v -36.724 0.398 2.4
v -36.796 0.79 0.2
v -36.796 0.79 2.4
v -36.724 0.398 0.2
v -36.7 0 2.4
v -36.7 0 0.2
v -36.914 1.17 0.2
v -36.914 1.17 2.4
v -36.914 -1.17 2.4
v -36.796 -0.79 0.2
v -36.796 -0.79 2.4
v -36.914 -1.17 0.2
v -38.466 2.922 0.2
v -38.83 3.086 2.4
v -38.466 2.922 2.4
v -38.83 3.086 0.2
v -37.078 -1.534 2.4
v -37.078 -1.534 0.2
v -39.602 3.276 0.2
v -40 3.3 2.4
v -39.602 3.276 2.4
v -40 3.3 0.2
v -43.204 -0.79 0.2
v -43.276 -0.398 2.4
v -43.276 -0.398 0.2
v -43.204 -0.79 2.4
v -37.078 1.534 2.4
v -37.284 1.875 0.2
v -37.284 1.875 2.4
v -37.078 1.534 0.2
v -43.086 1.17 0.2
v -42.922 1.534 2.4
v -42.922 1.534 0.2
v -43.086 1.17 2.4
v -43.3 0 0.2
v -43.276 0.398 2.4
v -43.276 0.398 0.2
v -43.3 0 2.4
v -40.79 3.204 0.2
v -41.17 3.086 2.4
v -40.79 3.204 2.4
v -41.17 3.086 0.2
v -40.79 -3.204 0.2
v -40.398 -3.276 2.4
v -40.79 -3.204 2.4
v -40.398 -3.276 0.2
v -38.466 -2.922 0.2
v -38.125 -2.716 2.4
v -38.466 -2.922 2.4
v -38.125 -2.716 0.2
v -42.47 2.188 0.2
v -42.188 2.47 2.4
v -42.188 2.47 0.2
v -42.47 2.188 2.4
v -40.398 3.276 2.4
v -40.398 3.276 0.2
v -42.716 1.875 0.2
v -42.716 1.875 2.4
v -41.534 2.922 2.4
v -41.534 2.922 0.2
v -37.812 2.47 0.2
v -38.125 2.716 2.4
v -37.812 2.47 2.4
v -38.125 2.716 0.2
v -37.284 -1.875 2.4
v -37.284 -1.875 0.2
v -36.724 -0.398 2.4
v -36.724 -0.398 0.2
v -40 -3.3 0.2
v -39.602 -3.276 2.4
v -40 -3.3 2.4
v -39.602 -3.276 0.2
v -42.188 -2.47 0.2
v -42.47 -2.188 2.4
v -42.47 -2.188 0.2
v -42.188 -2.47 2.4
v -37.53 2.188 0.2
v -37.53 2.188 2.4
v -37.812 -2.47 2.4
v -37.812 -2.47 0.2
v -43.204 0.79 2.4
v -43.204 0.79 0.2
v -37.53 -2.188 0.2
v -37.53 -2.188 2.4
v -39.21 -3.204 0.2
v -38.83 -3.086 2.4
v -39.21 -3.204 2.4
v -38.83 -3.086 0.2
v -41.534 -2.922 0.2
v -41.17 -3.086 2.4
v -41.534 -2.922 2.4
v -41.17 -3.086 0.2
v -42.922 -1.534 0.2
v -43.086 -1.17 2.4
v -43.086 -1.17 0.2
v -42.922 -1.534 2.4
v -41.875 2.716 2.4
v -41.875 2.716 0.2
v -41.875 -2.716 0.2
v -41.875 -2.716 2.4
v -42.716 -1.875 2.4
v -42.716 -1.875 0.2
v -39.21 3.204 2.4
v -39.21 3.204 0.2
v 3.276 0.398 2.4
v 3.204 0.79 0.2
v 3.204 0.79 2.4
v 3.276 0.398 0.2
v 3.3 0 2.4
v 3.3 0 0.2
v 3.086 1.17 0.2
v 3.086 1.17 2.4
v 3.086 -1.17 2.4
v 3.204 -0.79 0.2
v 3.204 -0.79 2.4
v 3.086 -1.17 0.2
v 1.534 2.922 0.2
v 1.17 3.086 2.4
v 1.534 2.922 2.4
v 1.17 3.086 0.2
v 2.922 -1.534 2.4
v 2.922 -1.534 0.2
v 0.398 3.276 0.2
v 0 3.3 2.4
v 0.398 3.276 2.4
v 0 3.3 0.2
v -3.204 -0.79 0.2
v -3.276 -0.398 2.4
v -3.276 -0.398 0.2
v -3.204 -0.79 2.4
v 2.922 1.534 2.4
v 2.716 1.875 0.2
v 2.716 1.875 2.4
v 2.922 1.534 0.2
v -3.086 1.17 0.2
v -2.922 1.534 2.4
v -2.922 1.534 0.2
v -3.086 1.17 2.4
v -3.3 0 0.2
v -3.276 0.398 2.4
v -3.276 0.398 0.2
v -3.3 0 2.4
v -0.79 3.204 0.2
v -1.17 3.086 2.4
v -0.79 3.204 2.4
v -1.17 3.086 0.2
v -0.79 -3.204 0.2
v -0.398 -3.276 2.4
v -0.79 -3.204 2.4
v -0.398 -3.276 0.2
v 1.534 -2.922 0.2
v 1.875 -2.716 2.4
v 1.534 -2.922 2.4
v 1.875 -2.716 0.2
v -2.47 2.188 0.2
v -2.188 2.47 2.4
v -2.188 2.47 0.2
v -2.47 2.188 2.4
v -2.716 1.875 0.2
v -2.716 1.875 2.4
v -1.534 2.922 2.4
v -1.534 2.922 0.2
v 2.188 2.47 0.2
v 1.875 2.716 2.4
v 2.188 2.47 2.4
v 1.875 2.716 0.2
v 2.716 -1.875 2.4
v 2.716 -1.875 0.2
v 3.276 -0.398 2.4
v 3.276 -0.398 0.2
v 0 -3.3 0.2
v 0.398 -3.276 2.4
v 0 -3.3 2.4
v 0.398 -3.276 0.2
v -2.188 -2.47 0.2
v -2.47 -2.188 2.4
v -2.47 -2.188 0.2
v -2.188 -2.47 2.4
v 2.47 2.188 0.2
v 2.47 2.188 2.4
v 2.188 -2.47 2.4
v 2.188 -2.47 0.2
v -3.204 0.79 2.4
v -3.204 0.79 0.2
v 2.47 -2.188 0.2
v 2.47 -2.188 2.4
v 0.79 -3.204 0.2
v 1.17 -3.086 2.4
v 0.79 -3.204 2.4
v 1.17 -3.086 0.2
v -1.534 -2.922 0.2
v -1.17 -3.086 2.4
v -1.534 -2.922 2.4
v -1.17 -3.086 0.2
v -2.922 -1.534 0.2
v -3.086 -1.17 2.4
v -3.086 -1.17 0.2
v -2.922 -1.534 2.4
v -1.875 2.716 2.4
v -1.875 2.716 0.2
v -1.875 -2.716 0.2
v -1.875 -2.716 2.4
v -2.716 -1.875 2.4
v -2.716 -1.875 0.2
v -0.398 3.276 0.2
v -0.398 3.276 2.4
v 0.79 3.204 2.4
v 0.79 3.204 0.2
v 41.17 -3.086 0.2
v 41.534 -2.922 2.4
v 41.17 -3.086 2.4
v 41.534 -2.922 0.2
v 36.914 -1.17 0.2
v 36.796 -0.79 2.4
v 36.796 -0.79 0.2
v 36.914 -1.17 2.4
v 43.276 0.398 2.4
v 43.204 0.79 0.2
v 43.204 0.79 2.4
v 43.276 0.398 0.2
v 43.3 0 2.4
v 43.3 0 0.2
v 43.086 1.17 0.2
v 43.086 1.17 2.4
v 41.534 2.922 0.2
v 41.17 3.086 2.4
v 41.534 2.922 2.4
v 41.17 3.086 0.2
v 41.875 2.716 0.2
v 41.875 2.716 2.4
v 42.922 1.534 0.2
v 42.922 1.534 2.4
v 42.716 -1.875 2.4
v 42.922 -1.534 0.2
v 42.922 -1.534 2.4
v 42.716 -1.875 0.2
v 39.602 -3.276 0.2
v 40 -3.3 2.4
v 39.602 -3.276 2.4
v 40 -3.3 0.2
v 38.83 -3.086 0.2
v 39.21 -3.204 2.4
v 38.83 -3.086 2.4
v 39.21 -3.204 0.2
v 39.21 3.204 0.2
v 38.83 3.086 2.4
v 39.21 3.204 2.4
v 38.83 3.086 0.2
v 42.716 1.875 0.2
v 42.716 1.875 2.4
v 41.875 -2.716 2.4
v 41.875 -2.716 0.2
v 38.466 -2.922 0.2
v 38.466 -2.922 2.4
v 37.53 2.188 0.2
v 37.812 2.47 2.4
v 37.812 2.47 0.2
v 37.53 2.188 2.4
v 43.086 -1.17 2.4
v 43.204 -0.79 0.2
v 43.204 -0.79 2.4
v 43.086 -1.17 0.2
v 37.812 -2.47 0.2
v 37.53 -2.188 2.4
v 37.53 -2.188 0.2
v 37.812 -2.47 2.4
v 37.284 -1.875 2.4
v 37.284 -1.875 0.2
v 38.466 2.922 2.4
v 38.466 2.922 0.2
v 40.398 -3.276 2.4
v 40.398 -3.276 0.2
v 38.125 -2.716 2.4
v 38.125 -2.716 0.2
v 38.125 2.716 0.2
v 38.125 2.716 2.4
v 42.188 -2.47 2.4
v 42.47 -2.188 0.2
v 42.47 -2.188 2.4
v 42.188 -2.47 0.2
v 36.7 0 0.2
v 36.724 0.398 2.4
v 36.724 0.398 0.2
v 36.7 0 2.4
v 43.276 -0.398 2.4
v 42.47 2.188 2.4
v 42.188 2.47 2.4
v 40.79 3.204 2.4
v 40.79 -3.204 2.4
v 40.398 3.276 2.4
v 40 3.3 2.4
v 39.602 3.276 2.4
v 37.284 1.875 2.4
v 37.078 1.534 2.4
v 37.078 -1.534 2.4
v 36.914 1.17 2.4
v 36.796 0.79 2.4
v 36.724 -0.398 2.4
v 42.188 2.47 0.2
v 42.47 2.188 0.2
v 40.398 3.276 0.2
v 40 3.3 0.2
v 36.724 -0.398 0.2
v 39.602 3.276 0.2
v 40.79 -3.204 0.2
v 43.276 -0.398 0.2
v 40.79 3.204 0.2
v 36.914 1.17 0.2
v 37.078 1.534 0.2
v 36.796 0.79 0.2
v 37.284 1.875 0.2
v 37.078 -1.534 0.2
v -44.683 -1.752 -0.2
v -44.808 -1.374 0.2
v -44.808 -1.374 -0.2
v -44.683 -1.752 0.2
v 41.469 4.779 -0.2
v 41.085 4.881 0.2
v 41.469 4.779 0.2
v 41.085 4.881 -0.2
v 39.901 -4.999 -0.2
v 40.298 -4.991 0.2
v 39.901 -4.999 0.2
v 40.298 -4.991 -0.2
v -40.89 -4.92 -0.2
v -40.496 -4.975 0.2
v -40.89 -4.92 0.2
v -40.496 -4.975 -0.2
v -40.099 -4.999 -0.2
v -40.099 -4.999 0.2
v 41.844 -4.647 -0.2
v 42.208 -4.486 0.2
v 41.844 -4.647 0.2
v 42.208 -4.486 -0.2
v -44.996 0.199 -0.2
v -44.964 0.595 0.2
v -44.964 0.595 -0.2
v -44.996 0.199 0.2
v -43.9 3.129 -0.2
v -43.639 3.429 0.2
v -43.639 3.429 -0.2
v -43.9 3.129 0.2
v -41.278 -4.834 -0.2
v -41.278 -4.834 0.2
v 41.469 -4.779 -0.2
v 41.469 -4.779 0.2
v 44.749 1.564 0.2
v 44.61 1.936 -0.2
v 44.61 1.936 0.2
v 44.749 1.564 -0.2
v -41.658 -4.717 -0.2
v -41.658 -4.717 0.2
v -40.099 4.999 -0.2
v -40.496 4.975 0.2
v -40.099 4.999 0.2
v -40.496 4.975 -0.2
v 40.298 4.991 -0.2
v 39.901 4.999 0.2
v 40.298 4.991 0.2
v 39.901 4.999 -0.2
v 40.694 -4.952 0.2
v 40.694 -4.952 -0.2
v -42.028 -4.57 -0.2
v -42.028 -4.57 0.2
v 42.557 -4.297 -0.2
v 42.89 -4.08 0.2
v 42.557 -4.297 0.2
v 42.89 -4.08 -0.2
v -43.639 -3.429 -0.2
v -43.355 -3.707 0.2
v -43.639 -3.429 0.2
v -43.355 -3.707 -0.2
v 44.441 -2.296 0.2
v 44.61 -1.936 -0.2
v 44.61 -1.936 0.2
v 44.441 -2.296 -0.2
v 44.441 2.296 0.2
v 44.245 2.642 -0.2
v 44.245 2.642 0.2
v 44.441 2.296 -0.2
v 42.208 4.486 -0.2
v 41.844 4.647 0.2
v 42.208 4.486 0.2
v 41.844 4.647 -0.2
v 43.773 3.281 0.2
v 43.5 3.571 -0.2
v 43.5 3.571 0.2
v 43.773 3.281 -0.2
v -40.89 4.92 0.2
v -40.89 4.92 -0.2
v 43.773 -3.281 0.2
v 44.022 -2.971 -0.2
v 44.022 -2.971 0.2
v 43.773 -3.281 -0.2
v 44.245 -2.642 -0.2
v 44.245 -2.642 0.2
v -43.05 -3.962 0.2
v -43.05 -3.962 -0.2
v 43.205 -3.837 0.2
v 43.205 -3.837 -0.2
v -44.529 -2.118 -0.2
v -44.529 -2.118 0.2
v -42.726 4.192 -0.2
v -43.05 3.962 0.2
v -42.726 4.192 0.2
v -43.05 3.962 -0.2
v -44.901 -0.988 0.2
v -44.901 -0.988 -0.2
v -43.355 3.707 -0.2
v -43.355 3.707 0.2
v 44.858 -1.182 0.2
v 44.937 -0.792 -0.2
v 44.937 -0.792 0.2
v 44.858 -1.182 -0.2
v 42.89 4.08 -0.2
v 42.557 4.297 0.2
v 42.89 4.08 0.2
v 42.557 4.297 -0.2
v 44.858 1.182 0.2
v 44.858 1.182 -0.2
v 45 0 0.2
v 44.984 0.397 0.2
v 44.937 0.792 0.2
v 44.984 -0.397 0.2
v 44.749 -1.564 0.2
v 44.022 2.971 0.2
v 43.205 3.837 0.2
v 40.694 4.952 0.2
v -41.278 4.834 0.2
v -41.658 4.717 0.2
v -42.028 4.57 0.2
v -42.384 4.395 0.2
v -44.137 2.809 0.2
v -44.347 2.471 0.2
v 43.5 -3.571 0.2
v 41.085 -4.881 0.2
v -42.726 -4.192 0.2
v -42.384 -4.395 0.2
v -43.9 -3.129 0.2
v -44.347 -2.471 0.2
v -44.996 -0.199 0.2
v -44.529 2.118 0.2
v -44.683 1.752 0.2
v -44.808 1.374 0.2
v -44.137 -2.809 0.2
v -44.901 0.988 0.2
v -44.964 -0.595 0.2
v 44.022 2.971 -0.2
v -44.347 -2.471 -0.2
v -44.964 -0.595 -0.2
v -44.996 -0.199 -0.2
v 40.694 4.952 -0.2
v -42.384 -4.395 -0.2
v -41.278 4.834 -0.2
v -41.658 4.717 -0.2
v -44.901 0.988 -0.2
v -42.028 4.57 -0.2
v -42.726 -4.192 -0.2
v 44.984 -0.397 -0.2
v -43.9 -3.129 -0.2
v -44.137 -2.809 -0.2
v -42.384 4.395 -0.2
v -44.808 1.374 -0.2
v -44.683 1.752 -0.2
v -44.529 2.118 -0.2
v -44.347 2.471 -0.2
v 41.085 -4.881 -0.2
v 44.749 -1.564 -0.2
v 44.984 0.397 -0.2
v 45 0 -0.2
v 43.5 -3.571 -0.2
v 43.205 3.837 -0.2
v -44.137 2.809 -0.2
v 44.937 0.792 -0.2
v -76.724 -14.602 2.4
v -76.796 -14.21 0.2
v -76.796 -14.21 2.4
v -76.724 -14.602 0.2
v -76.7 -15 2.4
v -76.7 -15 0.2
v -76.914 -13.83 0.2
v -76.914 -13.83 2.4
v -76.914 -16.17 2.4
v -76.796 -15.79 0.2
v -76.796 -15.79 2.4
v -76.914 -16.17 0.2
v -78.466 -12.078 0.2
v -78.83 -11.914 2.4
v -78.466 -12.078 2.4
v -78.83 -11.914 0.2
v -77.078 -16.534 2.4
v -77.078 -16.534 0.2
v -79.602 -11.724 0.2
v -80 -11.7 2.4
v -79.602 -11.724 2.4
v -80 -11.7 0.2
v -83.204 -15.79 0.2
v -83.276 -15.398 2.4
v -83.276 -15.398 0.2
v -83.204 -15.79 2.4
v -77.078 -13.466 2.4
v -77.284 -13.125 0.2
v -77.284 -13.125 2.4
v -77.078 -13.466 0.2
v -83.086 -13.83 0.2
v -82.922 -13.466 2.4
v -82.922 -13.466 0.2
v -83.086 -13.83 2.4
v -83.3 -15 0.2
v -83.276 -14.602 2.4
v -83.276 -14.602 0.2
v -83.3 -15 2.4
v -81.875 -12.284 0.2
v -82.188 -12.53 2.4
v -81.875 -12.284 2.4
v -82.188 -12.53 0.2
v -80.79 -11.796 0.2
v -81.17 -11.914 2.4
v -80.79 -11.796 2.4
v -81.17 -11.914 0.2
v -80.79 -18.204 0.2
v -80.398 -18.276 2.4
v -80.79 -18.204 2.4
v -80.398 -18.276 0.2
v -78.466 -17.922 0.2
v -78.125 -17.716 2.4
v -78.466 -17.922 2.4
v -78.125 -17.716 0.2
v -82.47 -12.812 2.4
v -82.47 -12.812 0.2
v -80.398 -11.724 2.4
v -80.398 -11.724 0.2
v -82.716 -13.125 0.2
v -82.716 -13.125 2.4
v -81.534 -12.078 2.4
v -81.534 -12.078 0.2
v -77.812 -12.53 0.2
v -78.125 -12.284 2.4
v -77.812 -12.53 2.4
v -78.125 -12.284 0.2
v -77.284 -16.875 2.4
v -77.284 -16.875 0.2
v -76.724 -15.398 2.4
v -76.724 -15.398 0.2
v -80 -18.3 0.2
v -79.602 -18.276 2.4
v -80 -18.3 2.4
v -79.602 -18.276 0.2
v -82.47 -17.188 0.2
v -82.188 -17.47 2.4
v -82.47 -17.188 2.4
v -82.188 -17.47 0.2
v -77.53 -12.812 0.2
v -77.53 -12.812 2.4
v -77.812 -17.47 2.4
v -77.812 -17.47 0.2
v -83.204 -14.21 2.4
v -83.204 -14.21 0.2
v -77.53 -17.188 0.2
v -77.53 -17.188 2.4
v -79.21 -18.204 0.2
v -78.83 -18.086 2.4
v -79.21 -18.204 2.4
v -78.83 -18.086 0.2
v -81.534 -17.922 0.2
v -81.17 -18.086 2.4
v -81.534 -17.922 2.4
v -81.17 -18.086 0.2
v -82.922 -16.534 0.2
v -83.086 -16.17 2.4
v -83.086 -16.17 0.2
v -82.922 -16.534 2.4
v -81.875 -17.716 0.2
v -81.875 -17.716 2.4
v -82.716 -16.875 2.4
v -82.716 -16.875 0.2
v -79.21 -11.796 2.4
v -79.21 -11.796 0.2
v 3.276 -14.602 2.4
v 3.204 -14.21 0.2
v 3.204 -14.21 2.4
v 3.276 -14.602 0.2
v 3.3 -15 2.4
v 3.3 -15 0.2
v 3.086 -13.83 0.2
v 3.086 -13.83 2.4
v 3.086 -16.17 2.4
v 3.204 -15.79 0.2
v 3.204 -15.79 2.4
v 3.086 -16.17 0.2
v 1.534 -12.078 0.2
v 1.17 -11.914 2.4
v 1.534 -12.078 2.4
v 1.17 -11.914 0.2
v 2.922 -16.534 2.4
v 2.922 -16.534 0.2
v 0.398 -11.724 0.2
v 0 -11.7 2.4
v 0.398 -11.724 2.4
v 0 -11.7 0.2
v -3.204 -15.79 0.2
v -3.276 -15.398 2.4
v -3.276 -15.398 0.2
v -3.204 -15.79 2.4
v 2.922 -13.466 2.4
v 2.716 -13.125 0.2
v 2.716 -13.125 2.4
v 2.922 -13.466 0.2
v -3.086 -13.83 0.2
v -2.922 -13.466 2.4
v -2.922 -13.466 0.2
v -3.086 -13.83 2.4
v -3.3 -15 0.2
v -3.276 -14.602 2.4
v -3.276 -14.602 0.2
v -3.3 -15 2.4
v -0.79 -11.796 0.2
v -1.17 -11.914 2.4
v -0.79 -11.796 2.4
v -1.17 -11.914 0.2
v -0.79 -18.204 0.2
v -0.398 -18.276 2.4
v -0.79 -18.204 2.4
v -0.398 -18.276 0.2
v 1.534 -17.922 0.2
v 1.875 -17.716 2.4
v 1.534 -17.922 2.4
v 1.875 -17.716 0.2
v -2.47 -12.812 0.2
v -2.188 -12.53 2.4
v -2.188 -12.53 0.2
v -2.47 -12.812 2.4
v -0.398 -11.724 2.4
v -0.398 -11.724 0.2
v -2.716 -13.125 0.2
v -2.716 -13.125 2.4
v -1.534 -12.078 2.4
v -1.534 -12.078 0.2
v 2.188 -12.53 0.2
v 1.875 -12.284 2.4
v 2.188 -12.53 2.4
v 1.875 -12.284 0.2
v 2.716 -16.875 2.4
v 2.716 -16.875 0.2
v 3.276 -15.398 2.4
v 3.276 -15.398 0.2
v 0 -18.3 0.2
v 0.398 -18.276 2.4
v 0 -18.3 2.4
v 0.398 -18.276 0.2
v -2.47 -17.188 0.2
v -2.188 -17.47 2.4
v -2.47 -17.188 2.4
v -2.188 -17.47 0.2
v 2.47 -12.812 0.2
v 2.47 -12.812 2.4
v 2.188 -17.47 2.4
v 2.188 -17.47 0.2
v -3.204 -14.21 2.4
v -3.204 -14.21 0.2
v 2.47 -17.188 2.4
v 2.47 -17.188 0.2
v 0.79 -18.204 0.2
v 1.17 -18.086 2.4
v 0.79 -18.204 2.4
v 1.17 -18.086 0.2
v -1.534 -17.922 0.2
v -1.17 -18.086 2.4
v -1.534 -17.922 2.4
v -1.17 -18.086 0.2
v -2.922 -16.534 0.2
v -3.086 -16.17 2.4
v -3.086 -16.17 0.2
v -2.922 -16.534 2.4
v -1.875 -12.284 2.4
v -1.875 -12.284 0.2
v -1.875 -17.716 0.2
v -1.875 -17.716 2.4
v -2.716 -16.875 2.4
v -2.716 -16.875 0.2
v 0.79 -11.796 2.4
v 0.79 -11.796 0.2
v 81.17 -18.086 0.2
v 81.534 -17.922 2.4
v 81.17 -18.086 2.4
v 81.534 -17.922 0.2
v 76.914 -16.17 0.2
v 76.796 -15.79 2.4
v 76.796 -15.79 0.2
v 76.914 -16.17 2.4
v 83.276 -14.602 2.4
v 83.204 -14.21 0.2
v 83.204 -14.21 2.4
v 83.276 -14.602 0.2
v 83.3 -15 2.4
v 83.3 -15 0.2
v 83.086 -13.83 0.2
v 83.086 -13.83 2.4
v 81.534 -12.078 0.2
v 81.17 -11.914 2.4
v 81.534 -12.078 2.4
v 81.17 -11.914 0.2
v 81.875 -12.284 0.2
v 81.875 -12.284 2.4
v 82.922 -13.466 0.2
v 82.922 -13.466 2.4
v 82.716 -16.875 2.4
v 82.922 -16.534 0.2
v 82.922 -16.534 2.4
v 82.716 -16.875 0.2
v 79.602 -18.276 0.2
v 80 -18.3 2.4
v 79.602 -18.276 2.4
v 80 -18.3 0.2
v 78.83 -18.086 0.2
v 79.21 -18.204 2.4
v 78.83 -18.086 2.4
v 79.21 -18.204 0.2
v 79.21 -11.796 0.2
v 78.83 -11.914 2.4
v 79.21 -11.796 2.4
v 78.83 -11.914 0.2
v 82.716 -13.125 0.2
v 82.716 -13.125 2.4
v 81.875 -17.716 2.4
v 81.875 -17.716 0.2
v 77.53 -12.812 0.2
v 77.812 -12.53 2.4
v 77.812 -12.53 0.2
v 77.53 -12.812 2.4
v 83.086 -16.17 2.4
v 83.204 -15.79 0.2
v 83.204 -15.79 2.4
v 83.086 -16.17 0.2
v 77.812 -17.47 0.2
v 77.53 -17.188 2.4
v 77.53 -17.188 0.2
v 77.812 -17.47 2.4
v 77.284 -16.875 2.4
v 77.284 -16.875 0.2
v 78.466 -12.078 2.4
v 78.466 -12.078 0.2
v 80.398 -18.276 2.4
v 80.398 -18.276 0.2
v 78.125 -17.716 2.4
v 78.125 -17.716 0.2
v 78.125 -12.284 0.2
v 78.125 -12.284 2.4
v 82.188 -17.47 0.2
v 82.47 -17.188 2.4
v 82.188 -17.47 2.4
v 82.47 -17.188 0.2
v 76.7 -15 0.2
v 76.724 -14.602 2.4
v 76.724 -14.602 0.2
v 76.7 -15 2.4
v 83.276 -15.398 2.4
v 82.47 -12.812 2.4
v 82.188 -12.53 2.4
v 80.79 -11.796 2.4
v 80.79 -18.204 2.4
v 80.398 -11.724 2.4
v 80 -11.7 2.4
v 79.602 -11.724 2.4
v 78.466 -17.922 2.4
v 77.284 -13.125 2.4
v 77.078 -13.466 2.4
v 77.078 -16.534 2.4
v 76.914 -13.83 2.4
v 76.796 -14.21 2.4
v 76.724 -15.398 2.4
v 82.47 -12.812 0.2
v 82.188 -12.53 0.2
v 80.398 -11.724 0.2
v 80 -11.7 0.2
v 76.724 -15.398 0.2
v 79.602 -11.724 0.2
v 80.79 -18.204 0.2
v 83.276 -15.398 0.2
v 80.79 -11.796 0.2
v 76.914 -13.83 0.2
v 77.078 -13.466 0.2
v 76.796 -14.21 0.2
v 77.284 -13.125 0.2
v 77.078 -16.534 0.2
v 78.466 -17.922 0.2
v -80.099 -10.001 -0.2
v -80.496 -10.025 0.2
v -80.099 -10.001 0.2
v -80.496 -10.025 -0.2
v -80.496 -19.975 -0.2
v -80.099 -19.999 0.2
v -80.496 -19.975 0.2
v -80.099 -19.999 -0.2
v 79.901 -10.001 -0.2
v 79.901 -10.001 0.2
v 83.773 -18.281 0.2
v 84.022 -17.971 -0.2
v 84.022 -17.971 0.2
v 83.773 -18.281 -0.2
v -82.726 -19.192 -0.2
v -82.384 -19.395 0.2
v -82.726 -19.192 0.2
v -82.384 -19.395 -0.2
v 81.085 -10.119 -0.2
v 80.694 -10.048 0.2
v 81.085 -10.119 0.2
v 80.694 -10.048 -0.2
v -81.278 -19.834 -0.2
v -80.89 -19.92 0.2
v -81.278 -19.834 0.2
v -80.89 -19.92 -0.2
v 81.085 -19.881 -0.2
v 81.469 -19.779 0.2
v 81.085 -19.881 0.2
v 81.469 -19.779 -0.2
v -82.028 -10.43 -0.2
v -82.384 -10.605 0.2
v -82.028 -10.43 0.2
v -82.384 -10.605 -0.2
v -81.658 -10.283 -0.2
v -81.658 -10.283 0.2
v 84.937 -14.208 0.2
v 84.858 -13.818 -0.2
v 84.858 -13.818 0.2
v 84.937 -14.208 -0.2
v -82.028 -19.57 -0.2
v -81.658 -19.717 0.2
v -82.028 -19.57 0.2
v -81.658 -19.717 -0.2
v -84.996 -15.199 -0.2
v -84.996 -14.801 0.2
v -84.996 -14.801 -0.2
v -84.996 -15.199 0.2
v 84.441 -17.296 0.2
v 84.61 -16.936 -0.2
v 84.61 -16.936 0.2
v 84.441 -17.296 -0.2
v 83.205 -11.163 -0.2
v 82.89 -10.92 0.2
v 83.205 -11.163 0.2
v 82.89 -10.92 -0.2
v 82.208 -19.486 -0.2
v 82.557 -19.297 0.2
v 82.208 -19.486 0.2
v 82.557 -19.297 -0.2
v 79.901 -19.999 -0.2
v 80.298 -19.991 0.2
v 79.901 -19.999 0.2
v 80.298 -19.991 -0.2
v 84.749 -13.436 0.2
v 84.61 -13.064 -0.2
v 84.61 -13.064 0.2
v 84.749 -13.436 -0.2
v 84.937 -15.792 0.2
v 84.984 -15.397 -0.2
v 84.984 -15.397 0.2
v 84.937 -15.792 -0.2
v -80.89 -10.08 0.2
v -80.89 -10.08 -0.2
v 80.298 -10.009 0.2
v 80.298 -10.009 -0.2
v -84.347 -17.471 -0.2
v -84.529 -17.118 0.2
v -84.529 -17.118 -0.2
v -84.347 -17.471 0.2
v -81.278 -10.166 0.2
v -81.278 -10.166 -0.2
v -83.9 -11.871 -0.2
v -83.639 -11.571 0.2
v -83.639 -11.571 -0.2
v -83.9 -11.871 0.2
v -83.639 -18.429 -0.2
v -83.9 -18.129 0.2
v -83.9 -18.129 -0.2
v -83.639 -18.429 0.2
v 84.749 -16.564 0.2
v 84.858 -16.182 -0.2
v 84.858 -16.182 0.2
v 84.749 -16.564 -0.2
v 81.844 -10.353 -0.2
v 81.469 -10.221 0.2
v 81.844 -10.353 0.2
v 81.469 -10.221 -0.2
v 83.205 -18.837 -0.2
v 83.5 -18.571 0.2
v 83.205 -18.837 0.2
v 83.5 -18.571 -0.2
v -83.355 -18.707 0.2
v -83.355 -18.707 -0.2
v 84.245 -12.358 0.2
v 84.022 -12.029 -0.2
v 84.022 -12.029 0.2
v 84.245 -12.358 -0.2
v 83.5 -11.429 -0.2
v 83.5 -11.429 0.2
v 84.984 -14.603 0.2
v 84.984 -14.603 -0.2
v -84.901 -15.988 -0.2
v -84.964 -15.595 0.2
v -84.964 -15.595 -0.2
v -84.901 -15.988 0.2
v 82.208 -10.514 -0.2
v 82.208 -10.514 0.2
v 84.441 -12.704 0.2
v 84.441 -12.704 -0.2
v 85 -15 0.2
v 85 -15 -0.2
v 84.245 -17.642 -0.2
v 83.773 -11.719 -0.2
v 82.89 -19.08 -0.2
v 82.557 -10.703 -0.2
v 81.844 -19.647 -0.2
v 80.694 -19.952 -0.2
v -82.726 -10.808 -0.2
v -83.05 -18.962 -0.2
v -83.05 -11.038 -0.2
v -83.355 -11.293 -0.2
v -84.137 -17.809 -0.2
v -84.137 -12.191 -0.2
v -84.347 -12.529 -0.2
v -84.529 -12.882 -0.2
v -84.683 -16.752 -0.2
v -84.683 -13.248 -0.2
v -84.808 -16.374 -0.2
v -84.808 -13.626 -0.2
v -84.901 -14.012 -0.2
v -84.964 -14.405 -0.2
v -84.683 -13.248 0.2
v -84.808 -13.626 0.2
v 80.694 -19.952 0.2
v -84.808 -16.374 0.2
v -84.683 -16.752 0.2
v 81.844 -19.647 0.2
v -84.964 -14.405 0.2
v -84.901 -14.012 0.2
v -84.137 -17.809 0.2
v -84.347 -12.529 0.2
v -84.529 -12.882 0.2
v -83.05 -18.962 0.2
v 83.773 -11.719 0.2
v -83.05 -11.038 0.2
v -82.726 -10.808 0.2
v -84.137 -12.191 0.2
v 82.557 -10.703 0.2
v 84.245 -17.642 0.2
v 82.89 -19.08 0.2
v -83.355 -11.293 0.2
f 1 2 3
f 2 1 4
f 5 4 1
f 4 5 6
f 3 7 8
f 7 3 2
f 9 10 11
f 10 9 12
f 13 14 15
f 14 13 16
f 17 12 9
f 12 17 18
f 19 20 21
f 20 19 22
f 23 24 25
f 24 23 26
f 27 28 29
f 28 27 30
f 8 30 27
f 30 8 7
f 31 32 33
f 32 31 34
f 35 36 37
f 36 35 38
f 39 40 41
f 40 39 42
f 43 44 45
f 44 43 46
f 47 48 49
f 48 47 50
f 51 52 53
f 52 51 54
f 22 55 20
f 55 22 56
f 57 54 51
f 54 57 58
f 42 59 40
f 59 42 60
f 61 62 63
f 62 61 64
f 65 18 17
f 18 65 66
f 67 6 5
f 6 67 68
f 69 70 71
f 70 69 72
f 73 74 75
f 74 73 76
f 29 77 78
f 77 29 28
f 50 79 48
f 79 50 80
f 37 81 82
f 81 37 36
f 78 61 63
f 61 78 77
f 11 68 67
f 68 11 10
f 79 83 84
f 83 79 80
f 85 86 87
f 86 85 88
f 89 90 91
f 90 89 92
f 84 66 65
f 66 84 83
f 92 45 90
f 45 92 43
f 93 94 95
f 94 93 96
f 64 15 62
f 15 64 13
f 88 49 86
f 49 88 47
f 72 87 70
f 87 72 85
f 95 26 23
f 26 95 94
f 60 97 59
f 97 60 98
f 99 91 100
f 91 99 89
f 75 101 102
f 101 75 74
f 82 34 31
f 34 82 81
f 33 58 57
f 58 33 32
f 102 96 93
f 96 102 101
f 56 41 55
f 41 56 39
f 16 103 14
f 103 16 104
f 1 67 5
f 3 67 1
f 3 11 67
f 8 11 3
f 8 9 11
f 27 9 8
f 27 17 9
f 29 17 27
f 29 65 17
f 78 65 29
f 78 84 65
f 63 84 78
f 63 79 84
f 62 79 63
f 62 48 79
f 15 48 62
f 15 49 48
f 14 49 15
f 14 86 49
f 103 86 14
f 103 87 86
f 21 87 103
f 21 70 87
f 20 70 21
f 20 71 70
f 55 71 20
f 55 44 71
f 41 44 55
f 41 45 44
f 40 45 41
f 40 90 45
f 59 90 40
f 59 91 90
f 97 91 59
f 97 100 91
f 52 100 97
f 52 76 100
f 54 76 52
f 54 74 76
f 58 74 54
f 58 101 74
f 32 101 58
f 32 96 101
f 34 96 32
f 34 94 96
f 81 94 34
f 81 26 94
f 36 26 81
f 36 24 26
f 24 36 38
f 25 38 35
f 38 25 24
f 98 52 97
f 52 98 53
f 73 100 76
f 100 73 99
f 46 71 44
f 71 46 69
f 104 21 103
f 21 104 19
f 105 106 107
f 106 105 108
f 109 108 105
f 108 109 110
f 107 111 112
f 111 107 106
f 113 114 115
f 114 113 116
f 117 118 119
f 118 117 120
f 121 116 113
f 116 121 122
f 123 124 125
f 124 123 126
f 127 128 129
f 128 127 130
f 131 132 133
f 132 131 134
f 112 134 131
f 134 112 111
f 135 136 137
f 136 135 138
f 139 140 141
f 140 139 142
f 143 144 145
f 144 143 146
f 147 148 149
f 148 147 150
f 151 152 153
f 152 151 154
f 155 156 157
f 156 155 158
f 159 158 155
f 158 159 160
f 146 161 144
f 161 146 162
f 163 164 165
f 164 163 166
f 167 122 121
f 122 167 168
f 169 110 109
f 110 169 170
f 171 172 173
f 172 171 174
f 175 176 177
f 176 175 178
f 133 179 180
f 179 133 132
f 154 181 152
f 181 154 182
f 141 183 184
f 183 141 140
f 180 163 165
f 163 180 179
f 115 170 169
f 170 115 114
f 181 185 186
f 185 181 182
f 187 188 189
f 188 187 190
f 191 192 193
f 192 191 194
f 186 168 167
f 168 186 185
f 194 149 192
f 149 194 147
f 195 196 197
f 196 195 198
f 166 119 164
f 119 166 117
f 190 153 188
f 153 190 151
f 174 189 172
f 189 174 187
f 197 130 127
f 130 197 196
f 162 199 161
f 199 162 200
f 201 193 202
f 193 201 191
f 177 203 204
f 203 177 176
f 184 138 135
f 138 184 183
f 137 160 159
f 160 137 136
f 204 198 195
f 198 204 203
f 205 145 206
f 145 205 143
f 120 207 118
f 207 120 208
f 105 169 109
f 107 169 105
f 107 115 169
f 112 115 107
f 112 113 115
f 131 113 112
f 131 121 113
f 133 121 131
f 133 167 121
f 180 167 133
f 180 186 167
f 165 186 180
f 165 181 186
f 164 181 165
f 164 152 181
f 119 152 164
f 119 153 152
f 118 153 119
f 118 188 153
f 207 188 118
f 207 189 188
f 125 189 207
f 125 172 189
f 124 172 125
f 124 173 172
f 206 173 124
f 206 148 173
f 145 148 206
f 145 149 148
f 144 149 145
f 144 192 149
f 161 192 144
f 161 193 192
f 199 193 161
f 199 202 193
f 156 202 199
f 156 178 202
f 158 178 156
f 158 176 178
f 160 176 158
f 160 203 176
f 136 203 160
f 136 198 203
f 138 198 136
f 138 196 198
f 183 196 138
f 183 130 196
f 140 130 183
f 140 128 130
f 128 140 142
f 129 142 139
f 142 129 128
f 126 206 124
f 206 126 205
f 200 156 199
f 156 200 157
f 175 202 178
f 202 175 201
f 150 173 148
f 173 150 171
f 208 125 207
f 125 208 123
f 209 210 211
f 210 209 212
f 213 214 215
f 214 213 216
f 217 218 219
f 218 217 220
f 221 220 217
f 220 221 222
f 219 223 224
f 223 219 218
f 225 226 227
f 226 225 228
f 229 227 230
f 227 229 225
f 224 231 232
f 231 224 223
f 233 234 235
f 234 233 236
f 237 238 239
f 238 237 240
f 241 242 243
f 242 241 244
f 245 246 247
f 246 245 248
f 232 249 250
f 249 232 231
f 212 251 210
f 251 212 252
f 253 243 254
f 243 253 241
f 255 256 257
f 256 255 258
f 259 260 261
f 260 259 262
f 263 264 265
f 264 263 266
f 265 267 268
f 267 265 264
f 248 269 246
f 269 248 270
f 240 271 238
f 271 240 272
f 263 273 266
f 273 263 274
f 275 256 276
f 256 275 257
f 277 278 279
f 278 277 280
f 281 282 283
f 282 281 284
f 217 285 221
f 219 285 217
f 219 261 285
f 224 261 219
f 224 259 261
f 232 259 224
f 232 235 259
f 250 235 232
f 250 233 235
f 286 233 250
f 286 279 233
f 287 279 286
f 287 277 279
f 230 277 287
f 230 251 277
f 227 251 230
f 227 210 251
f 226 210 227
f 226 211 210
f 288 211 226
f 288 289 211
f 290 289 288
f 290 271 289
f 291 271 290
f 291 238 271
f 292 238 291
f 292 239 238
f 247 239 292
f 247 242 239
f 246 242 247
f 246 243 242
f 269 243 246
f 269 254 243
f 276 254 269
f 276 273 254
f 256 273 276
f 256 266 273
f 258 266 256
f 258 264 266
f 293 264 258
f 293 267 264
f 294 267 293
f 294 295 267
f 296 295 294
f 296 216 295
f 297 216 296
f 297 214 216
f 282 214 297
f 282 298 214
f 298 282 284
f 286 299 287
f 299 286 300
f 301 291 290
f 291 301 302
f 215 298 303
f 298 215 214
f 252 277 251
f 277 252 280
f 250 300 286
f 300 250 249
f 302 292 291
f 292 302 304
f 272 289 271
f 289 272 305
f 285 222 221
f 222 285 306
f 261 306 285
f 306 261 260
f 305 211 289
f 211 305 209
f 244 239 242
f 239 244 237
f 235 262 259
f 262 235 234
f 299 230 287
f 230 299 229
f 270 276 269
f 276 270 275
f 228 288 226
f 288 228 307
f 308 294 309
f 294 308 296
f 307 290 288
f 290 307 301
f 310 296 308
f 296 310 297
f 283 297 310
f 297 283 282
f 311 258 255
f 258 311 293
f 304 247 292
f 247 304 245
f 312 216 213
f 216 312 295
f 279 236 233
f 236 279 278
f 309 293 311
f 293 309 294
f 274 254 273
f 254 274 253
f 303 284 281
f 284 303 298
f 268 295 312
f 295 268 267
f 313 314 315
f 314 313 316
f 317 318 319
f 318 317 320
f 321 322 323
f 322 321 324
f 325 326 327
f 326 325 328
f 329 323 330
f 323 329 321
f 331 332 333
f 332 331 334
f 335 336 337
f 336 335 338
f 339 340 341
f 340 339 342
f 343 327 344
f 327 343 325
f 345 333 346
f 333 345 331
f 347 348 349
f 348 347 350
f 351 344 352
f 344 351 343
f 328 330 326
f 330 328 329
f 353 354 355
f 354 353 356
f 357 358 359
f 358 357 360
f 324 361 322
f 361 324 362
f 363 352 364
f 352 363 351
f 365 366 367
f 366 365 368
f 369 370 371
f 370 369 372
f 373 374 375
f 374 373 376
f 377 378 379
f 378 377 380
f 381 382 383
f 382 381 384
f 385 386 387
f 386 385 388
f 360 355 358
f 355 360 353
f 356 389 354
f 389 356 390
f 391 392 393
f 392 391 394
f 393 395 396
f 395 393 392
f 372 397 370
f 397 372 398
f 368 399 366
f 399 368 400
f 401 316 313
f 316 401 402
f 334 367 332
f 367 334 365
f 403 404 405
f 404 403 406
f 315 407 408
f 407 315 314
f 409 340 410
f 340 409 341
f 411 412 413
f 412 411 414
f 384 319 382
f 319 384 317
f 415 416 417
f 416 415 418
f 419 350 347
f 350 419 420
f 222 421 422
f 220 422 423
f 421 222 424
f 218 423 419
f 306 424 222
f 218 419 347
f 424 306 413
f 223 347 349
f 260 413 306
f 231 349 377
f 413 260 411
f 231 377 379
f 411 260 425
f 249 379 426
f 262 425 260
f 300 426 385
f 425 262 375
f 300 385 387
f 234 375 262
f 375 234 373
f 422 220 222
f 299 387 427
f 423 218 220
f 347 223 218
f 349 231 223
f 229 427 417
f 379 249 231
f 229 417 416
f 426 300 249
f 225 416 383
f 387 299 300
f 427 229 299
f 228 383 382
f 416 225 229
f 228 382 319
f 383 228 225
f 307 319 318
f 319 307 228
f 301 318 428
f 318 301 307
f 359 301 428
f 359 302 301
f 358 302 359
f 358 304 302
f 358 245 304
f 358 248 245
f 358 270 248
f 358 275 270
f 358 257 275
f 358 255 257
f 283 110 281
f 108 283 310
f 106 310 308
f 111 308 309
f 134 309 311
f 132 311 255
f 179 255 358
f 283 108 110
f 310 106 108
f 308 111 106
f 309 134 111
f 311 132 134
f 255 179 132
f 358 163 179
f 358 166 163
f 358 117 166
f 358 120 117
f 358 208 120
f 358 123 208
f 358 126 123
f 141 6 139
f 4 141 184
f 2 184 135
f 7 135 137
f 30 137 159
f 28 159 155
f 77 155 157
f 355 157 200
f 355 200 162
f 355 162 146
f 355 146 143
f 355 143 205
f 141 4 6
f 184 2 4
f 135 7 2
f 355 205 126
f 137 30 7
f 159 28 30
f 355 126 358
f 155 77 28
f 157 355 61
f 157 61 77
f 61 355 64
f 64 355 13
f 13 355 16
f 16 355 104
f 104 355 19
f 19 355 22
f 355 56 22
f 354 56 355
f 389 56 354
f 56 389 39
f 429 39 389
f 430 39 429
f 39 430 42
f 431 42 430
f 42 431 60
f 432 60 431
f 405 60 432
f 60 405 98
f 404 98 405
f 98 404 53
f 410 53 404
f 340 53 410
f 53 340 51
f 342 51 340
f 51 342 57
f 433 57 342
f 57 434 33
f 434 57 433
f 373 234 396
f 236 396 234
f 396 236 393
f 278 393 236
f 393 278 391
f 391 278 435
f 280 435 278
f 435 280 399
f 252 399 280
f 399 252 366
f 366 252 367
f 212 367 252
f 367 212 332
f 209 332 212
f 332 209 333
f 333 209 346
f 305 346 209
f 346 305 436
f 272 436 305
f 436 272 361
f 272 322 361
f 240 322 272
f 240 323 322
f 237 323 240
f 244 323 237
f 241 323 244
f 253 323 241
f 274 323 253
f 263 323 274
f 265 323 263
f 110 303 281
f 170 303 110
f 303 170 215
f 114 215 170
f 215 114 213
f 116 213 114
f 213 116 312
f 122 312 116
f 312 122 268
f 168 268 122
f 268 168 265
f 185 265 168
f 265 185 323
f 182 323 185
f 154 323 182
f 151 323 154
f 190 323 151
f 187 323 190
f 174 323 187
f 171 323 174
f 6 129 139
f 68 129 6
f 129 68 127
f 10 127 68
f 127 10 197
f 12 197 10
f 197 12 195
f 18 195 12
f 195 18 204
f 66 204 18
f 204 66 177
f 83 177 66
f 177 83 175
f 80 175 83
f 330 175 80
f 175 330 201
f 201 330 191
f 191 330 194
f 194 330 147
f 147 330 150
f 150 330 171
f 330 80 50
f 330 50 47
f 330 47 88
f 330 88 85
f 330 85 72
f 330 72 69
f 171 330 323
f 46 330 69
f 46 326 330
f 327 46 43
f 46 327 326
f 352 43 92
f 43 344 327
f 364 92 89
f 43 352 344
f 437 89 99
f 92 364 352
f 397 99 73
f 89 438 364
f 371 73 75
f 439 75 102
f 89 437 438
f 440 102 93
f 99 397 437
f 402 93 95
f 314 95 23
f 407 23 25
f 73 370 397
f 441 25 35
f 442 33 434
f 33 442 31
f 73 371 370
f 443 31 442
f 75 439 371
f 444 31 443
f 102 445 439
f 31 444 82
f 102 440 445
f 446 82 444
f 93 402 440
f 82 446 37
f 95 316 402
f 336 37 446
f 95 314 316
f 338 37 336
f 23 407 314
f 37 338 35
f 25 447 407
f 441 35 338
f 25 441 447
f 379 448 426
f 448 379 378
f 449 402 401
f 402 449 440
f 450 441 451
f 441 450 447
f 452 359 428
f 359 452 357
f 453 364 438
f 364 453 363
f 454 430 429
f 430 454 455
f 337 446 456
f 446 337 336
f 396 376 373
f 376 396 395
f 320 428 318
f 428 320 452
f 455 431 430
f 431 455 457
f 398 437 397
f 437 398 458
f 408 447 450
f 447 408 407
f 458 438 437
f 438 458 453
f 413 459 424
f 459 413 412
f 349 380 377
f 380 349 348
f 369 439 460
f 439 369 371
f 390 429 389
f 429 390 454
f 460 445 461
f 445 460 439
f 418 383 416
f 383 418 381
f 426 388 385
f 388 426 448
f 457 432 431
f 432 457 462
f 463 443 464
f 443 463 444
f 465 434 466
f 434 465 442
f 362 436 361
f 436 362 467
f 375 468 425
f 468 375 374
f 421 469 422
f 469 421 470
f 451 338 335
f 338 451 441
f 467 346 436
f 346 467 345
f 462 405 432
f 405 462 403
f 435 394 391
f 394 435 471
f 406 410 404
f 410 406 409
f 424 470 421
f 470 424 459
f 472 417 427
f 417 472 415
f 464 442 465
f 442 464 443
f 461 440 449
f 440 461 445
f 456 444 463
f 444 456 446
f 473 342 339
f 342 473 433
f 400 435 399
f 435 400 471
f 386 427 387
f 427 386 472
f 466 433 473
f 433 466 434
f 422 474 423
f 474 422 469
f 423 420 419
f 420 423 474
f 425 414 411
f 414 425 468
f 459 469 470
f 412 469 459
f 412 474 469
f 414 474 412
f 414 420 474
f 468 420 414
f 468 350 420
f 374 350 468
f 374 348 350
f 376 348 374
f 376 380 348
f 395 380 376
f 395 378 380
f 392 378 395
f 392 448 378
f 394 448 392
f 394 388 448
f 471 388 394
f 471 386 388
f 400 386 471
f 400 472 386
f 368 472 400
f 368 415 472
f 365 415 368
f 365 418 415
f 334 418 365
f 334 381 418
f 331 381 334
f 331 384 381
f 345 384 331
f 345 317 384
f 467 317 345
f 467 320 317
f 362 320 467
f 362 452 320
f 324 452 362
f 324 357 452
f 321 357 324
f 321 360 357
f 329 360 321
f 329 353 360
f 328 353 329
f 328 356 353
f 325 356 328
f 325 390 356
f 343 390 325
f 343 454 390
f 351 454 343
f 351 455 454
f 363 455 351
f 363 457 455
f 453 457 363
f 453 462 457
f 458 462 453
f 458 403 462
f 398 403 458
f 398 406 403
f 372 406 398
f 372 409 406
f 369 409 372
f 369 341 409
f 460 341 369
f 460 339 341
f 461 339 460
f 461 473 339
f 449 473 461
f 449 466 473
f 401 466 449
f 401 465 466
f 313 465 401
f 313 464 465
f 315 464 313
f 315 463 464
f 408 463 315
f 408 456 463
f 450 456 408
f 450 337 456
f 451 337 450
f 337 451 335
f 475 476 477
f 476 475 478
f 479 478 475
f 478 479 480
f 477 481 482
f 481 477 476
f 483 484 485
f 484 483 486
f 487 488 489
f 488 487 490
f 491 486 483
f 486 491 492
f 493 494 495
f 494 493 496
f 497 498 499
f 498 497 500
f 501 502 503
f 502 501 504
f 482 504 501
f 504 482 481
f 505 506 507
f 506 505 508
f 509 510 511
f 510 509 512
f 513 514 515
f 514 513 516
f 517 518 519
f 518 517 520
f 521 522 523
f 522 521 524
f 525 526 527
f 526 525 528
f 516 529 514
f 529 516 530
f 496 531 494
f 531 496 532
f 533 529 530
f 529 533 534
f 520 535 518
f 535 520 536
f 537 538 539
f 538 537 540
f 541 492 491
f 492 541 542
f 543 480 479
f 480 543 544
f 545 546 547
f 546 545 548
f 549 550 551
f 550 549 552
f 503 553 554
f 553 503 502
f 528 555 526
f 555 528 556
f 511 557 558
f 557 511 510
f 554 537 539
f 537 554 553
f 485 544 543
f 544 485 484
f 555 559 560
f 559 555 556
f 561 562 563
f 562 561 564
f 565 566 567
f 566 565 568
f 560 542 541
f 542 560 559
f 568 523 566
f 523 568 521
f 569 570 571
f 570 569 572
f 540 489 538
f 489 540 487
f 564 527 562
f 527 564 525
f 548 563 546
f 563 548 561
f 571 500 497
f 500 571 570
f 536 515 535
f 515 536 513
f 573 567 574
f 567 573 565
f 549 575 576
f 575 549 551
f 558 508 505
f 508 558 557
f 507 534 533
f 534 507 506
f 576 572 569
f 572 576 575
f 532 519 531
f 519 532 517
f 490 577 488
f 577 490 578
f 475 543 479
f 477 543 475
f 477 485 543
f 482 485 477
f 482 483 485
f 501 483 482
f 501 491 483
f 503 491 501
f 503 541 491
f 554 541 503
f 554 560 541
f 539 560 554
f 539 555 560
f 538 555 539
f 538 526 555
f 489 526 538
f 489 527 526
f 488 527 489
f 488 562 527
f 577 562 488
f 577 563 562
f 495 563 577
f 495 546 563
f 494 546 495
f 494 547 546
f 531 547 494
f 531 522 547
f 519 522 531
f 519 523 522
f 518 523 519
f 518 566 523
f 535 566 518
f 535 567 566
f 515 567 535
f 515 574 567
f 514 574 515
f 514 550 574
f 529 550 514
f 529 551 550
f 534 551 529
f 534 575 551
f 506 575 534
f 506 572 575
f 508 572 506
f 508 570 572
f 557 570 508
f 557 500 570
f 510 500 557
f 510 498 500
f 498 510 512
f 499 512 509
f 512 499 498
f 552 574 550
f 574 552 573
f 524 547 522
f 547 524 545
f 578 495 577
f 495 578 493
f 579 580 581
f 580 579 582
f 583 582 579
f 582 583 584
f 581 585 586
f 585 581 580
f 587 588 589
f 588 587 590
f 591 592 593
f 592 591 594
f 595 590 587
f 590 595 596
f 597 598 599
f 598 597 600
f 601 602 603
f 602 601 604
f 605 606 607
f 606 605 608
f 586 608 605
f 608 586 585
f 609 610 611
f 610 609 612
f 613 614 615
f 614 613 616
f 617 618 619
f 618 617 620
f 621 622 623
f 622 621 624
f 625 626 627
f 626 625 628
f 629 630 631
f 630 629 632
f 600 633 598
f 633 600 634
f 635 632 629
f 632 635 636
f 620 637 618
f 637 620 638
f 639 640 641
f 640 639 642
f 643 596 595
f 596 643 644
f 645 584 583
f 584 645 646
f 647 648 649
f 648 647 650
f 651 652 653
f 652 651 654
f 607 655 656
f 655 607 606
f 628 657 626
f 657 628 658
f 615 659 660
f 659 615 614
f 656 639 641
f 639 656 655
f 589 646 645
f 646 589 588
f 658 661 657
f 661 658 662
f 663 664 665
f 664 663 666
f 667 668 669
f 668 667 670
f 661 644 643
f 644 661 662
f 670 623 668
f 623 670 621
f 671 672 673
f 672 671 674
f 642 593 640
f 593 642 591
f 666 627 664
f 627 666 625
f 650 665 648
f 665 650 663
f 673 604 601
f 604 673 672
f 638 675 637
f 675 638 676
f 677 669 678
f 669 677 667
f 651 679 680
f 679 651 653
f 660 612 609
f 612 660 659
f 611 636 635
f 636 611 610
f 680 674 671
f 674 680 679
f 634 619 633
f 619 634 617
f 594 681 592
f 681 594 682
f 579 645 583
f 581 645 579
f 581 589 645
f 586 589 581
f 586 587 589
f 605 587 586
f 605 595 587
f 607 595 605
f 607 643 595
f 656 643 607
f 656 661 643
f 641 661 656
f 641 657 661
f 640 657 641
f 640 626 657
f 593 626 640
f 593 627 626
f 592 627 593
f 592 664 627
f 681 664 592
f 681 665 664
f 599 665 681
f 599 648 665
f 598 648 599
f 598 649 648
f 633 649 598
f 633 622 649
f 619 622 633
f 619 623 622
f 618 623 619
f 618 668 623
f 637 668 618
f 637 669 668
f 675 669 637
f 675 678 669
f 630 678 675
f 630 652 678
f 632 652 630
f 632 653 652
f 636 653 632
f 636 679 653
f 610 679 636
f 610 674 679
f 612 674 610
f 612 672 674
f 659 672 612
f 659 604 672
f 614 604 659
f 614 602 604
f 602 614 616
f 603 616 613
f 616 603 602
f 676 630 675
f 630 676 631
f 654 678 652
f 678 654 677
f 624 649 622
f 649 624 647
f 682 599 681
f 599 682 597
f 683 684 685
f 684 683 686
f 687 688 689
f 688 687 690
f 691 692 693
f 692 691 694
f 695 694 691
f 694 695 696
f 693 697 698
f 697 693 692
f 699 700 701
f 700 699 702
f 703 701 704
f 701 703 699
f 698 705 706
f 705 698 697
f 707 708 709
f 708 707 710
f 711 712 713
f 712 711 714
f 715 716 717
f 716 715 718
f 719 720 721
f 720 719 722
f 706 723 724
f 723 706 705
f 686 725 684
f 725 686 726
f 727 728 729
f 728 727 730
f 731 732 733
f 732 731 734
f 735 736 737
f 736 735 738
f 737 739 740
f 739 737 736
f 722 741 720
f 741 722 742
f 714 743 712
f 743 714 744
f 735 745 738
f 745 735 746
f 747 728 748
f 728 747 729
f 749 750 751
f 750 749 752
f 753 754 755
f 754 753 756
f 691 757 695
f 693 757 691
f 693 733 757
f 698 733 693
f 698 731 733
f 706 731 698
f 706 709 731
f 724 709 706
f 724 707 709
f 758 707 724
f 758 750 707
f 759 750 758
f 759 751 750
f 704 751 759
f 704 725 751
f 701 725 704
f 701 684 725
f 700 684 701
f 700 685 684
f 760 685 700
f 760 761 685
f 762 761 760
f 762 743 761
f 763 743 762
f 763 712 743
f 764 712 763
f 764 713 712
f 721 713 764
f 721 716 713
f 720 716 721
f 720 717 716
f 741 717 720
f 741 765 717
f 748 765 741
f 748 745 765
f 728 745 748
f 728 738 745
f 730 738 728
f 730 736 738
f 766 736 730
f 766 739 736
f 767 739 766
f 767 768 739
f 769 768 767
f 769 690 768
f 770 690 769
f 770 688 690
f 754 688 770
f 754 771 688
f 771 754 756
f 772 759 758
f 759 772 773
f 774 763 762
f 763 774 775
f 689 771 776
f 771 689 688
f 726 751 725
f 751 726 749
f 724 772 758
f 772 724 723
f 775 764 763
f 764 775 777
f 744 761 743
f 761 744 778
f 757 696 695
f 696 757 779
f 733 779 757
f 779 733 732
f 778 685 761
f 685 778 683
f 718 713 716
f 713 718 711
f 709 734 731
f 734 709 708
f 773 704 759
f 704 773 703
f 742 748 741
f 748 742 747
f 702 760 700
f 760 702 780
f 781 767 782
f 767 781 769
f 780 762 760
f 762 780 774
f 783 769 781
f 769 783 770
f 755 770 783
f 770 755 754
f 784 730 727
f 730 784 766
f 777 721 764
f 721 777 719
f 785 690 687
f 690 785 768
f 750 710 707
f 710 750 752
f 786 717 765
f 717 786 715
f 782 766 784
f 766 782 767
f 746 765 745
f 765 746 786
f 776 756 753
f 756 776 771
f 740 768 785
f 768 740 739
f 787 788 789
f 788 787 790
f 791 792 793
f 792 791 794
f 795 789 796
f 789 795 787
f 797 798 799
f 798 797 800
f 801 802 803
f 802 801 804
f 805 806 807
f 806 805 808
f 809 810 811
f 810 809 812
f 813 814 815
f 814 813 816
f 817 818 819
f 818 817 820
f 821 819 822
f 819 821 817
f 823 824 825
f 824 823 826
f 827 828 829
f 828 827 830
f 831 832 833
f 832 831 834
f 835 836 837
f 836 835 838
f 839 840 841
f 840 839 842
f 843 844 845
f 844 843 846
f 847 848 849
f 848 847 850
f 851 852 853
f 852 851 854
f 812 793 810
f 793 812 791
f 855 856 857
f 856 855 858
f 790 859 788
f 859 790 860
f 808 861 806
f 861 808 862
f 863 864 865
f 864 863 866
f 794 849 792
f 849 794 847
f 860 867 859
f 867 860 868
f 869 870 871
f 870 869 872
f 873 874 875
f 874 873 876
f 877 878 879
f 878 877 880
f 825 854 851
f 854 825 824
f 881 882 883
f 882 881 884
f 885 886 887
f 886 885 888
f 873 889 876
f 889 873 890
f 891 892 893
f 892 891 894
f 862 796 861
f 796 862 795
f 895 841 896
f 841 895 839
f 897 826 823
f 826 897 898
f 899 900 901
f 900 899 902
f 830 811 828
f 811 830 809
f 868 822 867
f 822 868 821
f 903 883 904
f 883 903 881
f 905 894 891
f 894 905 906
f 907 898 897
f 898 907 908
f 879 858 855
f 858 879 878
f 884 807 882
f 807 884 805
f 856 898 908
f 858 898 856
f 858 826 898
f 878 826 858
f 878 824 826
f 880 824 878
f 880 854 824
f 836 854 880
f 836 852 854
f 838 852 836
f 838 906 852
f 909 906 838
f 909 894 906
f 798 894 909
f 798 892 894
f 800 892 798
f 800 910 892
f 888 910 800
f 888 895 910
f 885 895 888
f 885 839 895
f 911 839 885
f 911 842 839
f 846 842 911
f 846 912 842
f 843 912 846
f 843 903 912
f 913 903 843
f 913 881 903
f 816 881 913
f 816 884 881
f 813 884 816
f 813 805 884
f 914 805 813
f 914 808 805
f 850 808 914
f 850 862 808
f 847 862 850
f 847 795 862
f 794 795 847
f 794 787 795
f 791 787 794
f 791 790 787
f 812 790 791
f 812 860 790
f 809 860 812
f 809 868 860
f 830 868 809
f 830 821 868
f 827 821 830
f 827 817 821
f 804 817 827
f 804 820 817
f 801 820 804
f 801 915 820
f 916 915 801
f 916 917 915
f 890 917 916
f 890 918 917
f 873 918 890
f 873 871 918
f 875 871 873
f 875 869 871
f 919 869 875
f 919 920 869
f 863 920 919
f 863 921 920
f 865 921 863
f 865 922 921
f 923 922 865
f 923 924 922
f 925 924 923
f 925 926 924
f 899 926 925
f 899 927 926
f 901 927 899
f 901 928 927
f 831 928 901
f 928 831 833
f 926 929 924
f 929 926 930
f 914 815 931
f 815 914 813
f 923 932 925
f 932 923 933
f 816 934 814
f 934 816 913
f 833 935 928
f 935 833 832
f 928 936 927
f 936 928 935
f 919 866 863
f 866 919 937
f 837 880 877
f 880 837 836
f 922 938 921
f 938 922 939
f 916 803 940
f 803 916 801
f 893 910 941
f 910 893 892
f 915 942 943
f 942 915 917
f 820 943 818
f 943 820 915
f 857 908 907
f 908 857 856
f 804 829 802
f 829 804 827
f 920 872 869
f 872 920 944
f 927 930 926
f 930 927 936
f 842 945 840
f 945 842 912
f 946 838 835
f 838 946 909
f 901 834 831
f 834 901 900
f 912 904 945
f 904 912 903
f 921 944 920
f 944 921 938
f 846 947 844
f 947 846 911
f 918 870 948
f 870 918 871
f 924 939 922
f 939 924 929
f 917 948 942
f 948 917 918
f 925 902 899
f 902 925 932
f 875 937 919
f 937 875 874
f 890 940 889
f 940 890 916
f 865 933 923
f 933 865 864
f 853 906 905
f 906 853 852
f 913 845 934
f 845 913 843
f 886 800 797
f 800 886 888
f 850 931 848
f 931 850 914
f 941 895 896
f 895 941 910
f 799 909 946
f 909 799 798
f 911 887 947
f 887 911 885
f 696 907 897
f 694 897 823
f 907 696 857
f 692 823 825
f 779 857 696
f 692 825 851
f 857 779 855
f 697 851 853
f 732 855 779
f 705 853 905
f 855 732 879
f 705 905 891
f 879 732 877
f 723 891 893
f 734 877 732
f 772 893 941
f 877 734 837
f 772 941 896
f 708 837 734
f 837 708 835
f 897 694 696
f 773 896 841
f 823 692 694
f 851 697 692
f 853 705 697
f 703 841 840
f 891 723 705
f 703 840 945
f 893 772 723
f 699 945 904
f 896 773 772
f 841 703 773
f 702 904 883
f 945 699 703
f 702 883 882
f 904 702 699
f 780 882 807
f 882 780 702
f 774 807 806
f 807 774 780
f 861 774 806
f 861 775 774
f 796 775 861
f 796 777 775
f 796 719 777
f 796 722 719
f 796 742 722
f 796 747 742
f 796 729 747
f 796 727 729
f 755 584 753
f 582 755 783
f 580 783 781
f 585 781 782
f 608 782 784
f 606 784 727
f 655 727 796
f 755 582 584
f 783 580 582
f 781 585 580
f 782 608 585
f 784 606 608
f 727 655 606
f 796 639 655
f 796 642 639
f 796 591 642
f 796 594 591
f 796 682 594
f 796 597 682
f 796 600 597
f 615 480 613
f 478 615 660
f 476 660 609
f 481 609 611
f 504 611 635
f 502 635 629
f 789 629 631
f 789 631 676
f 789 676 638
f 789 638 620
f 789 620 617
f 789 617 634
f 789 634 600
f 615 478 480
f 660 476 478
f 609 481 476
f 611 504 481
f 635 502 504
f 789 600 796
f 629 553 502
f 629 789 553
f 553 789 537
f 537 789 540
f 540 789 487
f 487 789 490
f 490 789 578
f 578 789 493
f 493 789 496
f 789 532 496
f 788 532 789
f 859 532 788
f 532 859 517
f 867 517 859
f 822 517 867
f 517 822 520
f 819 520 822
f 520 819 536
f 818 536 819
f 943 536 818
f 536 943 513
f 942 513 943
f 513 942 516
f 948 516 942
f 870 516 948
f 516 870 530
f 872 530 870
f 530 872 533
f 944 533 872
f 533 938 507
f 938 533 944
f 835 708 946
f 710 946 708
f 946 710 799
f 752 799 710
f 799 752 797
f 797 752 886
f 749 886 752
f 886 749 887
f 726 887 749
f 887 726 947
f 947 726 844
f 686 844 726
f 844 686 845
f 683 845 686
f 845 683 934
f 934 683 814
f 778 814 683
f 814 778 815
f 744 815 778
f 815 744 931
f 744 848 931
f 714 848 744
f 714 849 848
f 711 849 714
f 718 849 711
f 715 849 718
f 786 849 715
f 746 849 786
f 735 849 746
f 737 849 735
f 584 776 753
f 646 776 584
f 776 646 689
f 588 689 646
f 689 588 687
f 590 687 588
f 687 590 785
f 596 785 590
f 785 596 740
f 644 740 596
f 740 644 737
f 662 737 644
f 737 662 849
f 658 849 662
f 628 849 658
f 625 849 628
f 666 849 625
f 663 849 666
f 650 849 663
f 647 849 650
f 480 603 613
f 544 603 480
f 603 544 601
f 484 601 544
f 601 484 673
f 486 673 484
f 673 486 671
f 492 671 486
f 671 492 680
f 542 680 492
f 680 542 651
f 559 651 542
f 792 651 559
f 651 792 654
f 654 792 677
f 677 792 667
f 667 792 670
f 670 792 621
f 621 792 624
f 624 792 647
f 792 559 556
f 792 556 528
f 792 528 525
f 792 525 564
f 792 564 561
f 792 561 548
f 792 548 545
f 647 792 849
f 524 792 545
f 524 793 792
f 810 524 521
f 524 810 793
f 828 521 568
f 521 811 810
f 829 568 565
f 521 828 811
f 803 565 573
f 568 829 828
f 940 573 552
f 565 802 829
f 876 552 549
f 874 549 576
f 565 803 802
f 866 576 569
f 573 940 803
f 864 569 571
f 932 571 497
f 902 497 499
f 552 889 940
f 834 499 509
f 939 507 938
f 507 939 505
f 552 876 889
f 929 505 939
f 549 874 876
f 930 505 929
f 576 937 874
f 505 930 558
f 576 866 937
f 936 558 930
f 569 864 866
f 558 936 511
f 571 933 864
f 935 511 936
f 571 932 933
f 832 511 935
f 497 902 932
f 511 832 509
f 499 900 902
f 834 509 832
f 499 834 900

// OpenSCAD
layer_height = 0.2;
nozzle_size = 0.4;
width = 10;
magnet_radius = 2.5;
magnet_height = 1.6;
shell_thickness = 2 * layer_height;

$fa = 1;
$fs = 0.4;

module magnet() {
	cylinder(r = magnet_radius + 2 * nozzle_size, magnet_height + 2 * shell_thickness);
}

module magnets(lenght) {
	trans = [lenght / 2, 0];
	for (i = [-1:1]) {
		translate(i * trans)
			magnet();
	}
}

module stripe(lenght) {
	hull() {
		trans = [lenght / 2, 0];
		for (i = [-1:2:1]) {
			translate(i * trans)
				cylinder(r = width / 2, shell_thickness, center = true);
		}
	}
}

module fridge_magnet(lenght) {
	stripe(lenght);
	magnets(lenght);
}

lenghts = [
	80,
	160
	];

for (i = [0:len(lenghts)-1])
	translate([0, - i * width * 1.5])
		fridge_magnet(lenghts[i]);
